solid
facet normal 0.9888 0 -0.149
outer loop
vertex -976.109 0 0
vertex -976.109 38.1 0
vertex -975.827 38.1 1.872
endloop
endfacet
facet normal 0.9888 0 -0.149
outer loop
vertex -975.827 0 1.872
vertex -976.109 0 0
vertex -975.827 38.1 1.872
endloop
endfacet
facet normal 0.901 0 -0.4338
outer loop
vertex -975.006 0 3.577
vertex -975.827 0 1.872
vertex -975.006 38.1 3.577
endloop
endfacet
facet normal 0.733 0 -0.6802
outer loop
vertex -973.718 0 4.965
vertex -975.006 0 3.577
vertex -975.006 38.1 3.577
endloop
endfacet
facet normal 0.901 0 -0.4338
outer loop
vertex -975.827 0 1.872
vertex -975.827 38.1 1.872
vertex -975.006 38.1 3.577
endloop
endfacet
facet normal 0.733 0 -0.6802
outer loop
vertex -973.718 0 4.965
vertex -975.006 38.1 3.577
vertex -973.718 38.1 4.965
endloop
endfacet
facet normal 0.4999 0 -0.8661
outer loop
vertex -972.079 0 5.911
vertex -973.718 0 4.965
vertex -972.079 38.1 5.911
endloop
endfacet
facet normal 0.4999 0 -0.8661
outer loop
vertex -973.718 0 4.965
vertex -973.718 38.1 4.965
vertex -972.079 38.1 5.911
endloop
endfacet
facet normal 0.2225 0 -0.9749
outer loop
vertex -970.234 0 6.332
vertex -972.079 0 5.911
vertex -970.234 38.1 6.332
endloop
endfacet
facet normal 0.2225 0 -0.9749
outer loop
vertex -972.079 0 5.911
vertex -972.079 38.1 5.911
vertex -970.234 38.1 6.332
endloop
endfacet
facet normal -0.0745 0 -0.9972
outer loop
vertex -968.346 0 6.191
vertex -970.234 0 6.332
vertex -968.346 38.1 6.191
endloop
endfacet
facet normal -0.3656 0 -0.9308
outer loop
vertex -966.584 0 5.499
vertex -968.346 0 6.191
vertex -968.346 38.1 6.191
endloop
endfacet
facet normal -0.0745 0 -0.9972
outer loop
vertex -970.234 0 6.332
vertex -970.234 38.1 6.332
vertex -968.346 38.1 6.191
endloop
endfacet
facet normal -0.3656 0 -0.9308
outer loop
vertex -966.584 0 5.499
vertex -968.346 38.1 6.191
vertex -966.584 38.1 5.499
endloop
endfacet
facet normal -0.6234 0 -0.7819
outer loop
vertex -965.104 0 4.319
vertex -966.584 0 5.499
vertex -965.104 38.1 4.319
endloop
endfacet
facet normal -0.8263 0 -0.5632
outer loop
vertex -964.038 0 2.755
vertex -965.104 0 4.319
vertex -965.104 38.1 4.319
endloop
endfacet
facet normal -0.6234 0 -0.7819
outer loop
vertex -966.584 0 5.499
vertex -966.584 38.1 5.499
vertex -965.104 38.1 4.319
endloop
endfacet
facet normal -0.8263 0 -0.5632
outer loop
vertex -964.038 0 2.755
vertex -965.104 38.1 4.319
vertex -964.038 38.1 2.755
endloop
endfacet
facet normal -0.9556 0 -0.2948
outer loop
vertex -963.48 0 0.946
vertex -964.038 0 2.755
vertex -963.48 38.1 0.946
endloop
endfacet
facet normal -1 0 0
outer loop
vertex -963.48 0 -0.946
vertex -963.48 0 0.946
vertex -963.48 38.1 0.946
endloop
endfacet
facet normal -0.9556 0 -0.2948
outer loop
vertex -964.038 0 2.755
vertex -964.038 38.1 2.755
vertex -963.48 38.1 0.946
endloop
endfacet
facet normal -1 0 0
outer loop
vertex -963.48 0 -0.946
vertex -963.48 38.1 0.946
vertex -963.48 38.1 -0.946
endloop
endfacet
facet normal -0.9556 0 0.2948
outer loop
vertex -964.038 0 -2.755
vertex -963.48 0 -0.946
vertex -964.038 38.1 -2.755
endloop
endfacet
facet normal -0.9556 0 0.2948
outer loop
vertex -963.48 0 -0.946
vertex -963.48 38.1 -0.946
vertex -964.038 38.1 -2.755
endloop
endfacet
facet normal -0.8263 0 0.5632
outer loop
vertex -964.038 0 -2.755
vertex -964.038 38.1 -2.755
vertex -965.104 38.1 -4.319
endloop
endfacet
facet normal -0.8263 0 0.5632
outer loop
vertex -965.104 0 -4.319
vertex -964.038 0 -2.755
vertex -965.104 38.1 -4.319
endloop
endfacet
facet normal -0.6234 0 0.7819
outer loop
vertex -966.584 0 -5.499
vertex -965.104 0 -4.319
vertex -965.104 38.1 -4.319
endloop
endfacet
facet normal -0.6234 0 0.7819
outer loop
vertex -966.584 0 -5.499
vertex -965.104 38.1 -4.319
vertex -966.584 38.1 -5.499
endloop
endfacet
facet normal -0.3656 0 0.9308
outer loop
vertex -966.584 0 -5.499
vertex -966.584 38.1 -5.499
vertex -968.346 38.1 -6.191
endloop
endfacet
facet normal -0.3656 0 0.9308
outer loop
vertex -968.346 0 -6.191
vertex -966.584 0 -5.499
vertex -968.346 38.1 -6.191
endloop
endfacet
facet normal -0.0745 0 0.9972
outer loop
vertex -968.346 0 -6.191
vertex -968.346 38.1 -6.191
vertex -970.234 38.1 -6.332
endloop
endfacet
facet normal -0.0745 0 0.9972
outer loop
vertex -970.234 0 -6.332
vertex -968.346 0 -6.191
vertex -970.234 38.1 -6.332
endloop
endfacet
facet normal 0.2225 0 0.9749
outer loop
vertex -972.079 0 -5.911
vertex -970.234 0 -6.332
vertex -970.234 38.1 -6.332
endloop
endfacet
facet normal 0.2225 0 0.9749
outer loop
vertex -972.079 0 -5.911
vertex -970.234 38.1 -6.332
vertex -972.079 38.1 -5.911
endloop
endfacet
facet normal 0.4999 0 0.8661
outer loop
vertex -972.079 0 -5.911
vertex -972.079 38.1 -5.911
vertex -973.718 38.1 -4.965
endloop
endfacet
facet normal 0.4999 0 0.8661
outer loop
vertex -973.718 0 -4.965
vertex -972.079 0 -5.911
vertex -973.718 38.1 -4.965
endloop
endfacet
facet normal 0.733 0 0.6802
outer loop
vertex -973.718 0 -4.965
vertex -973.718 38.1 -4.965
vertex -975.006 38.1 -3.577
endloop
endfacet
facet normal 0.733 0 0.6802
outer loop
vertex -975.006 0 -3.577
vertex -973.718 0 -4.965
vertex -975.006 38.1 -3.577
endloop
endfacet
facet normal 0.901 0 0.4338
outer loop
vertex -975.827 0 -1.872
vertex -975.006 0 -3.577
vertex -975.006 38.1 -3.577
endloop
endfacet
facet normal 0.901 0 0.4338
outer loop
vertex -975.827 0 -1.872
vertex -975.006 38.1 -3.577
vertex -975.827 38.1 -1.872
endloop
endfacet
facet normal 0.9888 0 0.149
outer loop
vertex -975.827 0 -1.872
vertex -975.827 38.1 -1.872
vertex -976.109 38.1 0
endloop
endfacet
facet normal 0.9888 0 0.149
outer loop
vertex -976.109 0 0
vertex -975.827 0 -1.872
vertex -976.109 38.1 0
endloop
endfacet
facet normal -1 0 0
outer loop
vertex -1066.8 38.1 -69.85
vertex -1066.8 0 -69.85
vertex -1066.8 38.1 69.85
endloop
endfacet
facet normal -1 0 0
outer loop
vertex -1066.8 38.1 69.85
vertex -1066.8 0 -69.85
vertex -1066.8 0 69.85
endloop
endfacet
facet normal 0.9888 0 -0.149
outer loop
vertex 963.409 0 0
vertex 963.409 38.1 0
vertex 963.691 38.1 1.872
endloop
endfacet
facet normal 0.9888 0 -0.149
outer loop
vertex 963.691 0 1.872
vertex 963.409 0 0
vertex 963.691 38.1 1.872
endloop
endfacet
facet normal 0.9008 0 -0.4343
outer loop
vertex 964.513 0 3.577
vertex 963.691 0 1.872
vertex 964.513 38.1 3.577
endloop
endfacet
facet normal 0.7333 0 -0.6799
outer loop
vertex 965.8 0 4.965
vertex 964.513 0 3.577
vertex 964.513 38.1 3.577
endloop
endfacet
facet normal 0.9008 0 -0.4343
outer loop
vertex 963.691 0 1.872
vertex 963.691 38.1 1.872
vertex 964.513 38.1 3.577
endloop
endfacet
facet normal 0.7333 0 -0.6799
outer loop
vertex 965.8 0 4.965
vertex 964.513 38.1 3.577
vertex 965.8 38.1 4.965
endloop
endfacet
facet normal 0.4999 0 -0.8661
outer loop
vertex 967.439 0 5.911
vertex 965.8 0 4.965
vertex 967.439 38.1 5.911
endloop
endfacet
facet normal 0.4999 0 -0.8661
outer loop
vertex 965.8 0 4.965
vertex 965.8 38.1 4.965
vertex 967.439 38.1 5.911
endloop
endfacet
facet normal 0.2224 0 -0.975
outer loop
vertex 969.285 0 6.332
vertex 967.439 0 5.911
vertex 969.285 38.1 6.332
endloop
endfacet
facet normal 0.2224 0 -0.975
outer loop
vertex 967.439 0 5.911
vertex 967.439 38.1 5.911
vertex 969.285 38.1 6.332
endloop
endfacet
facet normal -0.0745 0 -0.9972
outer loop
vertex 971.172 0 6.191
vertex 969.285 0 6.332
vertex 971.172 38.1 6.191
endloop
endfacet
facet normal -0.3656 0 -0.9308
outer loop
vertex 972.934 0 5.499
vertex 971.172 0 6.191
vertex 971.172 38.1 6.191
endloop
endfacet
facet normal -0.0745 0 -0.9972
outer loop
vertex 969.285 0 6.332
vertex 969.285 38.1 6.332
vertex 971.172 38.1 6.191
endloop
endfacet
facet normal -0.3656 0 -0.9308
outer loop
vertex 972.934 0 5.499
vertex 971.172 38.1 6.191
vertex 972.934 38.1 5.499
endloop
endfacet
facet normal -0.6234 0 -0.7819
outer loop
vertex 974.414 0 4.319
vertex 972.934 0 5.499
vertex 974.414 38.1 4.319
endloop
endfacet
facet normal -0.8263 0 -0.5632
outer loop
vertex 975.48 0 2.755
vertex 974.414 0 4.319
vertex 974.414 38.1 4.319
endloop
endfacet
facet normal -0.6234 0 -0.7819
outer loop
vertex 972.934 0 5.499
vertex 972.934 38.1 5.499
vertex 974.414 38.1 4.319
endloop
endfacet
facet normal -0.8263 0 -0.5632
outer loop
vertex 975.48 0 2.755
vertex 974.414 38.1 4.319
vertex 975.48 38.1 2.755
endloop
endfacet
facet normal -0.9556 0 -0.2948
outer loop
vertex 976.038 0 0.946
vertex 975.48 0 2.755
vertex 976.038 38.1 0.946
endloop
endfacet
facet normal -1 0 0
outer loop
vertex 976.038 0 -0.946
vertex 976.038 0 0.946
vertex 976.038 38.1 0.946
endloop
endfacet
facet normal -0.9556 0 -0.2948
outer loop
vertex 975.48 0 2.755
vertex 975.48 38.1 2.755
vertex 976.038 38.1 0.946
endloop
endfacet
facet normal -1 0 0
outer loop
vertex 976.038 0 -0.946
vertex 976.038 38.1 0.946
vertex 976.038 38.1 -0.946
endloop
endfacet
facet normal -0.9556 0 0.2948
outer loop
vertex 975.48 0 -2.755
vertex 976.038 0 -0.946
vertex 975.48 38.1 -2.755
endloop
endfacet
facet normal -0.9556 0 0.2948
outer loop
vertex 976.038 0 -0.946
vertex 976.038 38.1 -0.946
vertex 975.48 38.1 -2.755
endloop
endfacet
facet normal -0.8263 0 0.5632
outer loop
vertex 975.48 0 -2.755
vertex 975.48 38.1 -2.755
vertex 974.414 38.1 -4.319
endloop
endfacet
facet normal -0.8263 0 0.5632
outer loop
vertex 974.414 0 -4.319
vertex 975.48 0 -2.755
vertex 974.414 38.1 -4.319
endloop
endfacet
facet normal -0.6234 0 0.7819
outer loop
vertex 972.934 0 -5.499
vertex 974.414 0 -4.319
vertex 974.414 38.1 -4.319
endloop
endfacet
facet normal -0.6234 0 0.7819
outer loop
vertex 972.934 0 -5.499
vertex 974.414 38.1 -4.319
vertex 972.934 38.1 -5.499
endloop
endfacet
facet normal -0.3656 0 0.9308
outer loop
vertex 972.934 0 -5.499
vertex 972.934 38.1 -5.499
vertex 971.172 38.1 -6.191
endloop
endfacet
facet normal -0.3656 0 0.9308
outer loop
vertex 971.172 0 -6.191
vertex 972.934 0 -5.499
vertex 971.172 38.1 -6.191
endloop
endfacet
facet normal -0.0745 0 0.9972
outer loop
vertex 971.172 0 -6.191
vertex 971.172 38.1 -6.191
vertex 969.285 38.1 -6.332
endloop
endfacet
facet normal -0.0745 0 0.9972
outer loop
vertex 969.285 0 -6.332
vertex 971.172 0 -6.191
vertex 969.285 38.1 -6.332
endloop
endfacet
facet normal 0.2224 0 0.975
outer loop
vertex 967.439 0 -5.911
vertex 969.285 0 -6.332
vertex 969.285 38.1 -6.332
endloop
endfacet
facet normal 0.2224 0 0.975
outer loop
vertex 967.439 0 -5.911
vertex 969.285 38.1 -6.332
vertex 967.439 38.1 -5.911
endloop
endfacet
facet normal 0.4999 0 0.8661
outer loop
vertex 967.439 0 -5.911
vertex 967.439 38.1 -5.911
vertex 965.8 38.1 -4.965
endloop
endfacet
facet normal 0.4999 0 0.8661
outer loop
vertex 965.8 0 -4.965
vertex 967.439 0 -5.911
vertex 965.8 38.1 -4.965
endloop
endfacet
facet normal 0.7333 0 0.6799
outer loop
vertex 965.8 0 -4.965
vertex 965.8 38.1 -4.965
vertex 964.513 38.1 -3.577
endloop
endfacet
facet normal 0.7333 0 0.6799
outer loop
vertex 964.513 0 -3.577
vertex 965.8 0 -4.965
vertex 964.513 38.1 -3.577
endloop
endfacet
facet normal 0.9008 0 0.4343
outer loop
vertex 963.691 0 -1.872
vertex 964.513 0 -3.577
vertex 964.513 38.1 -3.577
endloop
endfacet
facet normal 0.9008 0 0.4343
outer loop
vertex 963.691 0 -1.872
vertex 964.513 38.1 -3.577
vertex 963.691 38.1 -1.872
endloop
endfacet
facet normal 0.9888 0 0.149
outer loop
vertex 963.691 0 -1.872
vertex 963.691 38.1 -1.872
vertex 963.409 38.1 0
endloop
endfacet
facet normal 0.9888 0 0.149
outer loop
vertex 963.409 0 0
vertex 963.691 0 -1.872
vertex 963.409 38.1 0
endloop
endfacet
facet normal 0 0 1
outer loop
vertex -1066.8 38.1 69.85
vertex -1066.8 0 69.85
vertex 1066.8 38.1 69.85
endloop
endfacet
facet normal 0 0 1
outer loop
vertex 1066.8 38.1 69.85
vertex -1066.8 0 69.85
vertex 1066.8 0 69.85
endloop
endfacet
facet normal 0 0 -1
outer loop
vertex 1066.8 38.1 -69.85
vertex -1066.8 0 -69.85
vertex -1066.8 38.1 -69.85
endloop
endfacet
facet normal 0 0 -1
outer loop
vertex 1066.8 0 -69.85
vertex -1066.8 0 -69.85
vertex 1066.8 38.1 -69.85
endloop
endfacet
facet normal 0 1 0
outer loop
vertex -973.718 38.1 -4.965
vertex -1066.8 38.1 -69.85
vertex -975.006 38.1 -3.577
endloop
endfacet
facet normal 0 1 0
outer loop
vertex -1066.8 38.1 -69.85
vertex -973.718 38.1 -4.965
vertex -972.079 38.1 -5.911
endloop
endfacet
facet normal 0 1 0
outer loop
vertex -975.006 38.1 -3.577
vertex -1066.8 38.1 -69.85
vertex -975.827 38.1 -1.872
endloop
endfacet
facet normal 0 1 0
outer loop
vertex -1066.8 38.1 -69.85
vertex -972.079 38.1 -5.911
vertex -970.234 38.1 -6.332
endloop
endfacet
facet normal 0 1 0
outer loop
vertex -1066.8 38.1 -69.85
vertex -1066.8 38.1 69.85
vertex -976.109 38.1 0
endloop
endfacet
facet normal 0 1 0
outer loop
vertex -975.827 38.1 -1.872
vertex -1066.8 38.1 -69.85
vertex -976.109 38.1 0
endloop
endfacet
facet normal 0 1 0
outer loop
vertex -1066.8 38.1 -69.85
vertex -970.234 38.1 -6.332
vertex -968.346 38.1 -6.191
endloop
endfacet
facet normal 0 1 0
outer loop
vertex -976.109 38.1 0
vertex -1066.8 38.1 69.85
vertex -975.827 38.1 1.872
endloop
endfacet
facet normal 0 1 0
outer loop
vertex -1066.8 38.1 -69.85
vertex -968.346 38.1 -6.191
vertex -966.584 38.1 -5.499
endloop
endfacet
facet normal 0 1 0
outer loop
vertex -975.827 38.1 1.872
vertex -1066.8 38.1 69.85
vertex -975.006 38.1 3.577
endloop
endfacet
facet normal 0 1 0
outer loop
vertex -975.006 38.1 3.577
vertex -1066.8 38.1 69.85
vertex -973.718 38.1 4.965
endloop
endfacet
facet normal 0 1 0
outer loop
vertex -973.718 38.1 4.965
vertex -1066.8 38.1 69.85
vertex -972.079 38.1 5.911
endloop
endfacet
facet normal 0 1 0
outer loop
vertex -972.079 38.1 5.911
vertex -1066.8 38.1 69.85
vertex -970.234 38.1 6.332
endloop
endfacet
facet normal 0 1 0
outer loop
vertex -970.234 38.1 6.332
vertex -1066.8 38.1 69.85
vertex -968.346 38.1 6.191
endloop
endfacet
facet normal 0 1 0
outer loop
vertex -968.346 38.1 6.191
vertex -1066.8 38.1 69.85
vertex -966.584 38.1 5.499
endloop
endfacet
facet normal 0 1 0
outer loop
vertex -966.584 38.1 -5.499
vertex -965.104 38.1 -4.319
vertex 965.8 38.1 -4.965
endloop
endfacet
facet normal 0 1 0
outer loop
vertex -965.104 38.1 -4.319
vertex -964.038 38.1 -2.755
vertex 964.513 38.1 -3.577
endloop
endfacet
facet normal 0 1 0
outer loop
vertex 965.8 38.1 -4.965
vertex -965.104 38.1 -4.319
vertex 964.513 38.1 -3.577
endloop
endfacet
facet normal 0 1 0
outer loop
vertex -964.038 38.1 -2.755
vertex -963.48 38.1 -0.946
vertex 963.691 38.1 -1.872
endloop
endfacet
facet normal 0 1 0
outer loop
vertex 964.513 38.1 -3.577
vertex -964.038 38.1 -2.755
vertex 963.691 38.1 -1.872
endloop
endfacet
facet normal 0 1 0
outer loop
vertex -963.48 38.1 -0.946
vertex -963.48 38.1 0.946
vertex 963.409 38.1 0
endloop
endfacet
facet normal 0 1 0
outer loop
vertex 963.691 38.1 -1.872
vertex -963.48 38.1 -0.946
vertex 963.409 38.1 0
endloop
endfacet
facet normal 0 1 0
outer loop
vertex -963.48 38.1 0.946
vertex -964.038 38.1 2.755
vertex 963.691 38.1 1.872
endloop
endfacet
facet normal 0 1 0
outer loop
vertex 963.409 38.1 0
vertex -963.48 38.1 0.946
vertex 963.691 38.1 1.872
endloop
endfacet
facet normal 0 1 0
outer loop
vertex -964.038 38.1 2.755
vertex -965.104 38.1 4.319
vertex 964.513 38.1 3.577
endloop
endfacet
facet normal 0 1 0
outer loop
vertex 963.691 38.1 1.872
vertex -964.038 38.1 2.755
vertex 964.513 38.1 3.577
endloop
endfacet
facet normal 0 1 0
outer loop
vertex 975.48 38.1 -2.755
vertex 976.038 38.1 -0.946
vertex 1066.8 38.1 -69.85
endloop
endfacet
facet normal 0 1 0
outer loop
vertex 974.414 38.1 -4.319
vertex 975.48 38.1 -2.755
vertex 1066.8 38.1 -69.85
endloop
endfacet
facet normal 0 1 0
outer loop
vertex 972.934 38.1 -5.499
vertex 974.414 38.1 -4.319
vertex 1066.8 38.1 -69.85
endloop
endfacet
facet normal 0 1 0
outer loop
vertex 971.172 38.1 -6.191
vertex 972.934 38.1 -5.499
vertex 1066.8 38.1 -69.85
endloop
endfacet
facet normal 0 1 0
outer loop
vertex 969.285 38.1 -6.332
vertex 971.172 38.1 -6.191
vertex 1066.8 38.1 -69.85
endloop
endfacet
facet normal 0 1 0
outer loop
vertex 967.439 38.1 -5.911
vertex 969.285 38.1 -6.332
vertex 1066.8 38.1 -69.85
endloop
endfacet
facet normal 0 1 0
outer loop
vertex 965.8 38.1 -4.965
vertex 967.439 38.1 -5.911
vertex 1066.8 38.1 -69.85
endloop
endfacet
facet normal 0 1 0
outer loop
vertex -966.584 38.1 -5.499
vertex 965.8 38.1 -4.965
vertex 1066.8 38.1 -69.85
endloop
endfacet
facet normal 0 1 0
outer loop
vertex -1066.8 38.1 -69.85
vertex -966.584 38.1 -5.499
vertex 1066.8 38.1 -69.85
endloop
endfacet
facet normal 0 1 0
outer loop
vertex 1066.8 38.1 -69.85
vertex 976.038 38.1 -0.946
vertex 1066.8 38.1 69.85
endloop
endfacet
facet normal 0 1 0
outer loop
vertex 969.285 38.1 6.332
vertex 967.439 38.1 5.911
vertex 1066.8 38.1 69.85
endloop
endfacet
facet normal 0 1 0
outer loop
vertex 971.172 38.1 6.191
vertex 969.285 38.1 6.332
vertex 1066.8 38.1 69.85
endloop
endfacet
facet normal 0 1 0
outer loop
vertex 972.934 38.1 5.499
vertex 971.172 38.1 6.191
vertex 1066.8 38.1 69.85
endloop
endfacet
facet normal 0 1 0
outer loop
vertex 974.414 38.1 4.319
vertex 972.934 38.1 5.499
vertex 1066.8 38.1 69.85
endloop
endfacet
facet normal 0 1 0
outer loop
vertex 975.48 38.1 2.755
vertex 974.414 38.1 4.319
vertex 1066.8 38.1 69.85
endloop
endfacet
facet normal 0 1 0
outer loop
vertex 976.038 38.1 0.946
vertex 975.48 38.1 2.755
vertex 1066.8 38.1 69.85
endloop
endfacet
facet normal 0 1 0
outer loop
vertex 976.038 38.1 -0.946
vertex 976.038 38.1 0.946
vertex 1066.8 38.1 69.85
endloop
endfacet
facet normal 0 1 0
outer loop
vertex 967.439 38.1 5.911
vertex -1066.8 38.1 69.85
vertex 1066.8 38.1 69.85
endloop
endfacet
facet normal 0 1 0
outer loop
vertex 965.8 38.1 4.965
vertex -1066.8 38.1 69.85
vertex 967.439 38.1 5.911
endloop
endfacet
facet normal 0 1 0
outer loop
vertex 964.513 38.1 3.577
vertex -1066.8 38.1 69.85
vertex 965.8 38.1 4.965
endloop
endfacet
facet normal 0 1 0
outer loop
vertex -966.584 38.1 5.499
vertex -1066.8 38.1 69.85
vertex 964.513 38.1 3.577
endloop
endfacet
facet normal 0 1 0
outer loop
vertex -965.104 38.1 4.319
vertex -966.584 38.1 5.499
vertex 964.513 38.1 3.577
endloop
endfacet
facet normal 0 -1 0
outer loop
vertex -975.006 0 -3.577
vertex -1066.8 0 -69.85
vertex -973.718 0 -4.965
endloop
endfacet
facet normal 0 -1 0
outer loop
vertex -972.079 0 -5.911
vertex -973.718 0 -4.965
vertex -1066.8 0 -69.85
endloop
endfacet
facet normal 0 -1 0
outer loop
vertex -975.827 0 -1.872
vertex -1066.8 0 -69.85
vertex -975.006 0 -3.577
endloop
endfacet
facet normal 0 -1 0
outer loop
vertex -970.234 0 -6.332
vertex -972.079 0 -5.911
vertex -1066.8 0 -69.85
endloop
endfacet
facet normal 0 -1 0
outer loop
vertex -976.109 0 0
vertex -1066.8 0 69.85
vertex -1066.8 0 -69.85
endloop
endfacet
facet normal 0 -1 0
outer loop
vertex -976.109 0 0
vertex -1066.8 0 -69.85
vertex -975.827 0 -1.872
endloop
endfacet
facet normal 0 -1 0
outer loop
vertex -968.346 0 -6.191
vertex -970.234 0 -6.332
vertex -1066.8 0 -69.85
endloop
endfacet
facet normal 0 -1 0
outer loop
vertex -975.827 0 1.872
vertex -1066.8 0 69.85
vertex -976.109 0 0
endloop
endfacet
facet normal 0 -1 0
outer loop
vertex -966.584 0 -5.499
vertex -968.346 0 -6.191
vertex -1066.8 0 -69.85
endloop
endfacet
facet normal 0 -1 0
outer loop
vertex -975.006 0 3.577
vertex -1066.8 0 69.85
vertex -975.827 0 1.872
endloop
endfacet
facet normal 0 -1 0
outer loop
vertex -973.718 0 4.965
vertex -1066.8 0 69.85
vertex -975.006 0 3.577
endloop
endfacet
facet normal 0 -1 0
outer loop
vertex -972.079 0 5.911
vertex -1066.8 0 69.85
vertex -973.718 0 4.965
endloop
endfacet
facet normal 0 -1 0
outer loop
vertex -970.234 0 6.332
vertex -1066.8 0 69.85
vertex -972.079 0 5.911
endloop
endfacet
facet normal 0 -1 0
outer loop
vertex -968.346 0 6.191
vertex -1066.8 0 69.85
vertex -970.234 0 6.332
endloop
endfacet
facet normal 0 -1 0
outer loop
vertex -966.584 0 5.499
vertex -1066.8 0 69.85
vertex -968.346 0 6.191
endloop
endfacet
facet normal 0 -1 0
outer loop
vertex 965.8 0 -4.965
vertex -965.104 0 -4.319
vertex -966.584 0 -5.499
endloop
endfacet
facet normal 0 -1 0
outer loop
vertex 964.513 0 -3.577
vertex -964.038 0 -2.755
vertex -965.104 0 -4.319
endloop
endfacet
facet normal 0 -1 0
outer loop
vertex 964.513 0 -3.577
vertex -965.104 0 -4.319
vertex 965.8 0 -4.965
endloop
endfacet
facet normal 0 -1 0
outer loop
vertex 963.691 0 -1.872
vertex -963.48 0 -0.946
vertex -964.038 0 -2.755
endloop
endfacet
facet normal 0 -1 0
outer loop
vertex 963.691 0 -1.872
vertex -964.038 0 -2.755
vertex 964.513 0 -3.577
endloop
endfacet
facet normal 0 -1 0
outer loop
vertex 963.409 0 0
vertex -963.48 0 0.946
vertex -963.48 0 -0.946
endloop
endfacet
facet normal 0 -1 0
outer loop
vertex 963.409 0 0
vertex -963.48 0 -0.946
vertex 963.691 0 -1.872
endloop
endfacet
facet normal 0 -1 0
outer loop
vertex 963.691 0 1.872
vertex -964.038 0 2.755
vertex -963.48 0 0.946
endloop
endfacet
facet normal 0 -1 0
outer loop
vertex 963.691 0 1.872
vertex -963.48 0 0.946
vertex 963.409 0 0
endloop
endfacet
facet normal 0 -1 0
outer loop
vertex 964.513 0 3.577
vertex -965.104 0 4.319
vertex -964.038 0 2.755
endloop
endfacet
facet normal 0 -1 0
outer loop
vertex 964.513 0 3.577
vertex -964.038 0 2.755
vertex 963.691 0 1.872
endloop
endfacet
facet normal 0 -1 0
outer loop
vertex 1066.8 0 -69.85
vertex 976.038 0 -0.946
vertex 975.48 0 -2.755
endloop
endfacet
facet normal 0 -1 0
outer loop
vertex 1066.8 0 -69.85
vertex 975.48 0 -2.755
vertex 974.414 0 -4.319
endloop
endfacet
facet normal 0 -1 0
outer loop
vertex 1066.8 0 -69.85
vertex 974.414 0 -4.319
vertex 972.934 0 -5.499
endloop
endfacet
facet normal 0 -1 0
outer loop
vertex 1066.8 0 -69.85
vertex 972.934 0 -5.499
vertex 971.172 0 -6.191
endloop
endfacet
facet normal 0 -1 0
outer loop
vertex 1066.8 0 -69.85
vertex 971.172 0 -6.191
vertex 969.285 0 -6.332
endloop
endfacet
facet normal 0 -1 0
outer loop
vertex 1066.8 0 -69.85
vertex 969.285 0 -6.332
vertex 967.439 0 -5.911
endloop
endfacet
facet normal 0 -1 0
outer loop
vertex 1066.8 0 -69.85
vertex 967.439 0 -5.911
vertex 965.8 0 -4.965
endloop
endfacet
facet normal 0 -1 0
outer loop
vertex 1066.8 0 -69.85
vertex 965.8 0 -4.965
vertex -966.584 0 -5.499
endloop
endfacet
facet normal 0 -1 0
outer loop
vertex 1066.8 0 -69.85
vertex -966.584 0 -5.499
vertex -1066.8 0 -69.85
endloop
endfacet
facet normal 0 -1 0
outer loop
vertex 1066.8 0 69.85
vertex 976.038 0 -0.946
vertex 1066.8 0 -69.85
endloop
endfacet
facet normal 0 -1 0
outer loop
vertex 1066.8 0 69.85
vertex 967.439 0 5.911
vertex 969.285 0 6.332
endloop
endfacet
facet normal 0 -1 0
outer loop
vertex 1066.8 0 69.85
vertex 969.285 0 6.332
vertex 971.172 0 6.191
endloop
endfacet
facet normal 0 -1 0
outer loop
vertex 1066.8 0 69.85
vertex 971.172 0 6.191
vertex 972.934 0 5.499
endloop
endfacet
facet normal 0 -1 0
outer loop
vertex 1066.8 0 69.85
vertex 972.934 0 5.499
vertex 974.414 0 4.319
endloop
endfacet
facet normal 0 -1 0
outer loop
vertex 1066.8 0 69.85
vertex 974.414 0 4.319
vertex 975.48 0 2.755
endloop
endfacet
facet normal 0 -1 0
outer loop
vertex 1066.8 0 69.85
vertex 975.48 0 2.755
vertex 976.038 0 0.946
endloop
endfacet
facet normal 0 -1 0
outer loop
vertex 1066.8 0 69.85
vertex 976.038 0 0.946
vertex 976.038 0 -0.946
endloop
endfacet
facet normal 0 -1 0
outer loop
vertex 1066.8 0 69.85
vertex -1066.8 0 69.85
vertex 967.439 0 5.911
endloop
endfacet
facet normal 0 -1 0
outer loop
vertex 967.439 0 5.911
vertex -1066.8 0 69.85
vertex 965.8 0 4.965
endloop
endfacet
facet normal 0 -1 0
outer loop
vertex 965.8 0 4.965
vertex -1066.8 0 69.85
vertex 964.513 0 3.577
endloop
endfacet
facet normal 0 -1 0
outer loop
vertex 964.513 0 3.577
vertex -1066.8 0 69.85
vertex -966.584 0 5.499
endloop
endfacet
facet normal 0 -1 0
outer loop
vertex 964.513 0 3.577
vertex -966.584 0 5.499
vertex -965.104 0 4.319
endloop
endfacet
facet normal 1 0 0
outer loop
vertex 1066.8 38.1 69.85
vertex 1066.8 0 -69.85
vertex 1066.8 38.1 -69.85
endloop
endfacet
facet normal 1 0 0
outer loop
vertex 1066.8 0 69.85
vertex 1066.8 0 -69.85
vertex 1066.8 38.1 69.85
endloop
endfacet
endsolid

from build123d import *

# Parameters (mm, degrees)
F0_W     = 2133.6
F0_H     = 139.7
F1_DEPTH = 38.1
F2_D     = 12.7
F2_DEPTH = 609.6
F3_D     = 12.7
F3_DEPTH = 609.6


with BuildPart() as f1:
    # F0 (on Front) → F1 (new body)
    with BuildSketch(Plane.XZ):
        Rectangle(F0_W, F0_H)
    extrude(amount=-F1_DEPTH)

    # F2
    with Locations(Plane.XZ):
        with Locations((-969.7593, 0)):
            Hole(F2_D / 2, depth=F2_DEPTH)

    # F3
    with Locations(Plane.XZ):
        with Locations((969.7593, 0)):
            Hole(F3_D / 2, depth=F3_DEPTH)


solid = f1.part
